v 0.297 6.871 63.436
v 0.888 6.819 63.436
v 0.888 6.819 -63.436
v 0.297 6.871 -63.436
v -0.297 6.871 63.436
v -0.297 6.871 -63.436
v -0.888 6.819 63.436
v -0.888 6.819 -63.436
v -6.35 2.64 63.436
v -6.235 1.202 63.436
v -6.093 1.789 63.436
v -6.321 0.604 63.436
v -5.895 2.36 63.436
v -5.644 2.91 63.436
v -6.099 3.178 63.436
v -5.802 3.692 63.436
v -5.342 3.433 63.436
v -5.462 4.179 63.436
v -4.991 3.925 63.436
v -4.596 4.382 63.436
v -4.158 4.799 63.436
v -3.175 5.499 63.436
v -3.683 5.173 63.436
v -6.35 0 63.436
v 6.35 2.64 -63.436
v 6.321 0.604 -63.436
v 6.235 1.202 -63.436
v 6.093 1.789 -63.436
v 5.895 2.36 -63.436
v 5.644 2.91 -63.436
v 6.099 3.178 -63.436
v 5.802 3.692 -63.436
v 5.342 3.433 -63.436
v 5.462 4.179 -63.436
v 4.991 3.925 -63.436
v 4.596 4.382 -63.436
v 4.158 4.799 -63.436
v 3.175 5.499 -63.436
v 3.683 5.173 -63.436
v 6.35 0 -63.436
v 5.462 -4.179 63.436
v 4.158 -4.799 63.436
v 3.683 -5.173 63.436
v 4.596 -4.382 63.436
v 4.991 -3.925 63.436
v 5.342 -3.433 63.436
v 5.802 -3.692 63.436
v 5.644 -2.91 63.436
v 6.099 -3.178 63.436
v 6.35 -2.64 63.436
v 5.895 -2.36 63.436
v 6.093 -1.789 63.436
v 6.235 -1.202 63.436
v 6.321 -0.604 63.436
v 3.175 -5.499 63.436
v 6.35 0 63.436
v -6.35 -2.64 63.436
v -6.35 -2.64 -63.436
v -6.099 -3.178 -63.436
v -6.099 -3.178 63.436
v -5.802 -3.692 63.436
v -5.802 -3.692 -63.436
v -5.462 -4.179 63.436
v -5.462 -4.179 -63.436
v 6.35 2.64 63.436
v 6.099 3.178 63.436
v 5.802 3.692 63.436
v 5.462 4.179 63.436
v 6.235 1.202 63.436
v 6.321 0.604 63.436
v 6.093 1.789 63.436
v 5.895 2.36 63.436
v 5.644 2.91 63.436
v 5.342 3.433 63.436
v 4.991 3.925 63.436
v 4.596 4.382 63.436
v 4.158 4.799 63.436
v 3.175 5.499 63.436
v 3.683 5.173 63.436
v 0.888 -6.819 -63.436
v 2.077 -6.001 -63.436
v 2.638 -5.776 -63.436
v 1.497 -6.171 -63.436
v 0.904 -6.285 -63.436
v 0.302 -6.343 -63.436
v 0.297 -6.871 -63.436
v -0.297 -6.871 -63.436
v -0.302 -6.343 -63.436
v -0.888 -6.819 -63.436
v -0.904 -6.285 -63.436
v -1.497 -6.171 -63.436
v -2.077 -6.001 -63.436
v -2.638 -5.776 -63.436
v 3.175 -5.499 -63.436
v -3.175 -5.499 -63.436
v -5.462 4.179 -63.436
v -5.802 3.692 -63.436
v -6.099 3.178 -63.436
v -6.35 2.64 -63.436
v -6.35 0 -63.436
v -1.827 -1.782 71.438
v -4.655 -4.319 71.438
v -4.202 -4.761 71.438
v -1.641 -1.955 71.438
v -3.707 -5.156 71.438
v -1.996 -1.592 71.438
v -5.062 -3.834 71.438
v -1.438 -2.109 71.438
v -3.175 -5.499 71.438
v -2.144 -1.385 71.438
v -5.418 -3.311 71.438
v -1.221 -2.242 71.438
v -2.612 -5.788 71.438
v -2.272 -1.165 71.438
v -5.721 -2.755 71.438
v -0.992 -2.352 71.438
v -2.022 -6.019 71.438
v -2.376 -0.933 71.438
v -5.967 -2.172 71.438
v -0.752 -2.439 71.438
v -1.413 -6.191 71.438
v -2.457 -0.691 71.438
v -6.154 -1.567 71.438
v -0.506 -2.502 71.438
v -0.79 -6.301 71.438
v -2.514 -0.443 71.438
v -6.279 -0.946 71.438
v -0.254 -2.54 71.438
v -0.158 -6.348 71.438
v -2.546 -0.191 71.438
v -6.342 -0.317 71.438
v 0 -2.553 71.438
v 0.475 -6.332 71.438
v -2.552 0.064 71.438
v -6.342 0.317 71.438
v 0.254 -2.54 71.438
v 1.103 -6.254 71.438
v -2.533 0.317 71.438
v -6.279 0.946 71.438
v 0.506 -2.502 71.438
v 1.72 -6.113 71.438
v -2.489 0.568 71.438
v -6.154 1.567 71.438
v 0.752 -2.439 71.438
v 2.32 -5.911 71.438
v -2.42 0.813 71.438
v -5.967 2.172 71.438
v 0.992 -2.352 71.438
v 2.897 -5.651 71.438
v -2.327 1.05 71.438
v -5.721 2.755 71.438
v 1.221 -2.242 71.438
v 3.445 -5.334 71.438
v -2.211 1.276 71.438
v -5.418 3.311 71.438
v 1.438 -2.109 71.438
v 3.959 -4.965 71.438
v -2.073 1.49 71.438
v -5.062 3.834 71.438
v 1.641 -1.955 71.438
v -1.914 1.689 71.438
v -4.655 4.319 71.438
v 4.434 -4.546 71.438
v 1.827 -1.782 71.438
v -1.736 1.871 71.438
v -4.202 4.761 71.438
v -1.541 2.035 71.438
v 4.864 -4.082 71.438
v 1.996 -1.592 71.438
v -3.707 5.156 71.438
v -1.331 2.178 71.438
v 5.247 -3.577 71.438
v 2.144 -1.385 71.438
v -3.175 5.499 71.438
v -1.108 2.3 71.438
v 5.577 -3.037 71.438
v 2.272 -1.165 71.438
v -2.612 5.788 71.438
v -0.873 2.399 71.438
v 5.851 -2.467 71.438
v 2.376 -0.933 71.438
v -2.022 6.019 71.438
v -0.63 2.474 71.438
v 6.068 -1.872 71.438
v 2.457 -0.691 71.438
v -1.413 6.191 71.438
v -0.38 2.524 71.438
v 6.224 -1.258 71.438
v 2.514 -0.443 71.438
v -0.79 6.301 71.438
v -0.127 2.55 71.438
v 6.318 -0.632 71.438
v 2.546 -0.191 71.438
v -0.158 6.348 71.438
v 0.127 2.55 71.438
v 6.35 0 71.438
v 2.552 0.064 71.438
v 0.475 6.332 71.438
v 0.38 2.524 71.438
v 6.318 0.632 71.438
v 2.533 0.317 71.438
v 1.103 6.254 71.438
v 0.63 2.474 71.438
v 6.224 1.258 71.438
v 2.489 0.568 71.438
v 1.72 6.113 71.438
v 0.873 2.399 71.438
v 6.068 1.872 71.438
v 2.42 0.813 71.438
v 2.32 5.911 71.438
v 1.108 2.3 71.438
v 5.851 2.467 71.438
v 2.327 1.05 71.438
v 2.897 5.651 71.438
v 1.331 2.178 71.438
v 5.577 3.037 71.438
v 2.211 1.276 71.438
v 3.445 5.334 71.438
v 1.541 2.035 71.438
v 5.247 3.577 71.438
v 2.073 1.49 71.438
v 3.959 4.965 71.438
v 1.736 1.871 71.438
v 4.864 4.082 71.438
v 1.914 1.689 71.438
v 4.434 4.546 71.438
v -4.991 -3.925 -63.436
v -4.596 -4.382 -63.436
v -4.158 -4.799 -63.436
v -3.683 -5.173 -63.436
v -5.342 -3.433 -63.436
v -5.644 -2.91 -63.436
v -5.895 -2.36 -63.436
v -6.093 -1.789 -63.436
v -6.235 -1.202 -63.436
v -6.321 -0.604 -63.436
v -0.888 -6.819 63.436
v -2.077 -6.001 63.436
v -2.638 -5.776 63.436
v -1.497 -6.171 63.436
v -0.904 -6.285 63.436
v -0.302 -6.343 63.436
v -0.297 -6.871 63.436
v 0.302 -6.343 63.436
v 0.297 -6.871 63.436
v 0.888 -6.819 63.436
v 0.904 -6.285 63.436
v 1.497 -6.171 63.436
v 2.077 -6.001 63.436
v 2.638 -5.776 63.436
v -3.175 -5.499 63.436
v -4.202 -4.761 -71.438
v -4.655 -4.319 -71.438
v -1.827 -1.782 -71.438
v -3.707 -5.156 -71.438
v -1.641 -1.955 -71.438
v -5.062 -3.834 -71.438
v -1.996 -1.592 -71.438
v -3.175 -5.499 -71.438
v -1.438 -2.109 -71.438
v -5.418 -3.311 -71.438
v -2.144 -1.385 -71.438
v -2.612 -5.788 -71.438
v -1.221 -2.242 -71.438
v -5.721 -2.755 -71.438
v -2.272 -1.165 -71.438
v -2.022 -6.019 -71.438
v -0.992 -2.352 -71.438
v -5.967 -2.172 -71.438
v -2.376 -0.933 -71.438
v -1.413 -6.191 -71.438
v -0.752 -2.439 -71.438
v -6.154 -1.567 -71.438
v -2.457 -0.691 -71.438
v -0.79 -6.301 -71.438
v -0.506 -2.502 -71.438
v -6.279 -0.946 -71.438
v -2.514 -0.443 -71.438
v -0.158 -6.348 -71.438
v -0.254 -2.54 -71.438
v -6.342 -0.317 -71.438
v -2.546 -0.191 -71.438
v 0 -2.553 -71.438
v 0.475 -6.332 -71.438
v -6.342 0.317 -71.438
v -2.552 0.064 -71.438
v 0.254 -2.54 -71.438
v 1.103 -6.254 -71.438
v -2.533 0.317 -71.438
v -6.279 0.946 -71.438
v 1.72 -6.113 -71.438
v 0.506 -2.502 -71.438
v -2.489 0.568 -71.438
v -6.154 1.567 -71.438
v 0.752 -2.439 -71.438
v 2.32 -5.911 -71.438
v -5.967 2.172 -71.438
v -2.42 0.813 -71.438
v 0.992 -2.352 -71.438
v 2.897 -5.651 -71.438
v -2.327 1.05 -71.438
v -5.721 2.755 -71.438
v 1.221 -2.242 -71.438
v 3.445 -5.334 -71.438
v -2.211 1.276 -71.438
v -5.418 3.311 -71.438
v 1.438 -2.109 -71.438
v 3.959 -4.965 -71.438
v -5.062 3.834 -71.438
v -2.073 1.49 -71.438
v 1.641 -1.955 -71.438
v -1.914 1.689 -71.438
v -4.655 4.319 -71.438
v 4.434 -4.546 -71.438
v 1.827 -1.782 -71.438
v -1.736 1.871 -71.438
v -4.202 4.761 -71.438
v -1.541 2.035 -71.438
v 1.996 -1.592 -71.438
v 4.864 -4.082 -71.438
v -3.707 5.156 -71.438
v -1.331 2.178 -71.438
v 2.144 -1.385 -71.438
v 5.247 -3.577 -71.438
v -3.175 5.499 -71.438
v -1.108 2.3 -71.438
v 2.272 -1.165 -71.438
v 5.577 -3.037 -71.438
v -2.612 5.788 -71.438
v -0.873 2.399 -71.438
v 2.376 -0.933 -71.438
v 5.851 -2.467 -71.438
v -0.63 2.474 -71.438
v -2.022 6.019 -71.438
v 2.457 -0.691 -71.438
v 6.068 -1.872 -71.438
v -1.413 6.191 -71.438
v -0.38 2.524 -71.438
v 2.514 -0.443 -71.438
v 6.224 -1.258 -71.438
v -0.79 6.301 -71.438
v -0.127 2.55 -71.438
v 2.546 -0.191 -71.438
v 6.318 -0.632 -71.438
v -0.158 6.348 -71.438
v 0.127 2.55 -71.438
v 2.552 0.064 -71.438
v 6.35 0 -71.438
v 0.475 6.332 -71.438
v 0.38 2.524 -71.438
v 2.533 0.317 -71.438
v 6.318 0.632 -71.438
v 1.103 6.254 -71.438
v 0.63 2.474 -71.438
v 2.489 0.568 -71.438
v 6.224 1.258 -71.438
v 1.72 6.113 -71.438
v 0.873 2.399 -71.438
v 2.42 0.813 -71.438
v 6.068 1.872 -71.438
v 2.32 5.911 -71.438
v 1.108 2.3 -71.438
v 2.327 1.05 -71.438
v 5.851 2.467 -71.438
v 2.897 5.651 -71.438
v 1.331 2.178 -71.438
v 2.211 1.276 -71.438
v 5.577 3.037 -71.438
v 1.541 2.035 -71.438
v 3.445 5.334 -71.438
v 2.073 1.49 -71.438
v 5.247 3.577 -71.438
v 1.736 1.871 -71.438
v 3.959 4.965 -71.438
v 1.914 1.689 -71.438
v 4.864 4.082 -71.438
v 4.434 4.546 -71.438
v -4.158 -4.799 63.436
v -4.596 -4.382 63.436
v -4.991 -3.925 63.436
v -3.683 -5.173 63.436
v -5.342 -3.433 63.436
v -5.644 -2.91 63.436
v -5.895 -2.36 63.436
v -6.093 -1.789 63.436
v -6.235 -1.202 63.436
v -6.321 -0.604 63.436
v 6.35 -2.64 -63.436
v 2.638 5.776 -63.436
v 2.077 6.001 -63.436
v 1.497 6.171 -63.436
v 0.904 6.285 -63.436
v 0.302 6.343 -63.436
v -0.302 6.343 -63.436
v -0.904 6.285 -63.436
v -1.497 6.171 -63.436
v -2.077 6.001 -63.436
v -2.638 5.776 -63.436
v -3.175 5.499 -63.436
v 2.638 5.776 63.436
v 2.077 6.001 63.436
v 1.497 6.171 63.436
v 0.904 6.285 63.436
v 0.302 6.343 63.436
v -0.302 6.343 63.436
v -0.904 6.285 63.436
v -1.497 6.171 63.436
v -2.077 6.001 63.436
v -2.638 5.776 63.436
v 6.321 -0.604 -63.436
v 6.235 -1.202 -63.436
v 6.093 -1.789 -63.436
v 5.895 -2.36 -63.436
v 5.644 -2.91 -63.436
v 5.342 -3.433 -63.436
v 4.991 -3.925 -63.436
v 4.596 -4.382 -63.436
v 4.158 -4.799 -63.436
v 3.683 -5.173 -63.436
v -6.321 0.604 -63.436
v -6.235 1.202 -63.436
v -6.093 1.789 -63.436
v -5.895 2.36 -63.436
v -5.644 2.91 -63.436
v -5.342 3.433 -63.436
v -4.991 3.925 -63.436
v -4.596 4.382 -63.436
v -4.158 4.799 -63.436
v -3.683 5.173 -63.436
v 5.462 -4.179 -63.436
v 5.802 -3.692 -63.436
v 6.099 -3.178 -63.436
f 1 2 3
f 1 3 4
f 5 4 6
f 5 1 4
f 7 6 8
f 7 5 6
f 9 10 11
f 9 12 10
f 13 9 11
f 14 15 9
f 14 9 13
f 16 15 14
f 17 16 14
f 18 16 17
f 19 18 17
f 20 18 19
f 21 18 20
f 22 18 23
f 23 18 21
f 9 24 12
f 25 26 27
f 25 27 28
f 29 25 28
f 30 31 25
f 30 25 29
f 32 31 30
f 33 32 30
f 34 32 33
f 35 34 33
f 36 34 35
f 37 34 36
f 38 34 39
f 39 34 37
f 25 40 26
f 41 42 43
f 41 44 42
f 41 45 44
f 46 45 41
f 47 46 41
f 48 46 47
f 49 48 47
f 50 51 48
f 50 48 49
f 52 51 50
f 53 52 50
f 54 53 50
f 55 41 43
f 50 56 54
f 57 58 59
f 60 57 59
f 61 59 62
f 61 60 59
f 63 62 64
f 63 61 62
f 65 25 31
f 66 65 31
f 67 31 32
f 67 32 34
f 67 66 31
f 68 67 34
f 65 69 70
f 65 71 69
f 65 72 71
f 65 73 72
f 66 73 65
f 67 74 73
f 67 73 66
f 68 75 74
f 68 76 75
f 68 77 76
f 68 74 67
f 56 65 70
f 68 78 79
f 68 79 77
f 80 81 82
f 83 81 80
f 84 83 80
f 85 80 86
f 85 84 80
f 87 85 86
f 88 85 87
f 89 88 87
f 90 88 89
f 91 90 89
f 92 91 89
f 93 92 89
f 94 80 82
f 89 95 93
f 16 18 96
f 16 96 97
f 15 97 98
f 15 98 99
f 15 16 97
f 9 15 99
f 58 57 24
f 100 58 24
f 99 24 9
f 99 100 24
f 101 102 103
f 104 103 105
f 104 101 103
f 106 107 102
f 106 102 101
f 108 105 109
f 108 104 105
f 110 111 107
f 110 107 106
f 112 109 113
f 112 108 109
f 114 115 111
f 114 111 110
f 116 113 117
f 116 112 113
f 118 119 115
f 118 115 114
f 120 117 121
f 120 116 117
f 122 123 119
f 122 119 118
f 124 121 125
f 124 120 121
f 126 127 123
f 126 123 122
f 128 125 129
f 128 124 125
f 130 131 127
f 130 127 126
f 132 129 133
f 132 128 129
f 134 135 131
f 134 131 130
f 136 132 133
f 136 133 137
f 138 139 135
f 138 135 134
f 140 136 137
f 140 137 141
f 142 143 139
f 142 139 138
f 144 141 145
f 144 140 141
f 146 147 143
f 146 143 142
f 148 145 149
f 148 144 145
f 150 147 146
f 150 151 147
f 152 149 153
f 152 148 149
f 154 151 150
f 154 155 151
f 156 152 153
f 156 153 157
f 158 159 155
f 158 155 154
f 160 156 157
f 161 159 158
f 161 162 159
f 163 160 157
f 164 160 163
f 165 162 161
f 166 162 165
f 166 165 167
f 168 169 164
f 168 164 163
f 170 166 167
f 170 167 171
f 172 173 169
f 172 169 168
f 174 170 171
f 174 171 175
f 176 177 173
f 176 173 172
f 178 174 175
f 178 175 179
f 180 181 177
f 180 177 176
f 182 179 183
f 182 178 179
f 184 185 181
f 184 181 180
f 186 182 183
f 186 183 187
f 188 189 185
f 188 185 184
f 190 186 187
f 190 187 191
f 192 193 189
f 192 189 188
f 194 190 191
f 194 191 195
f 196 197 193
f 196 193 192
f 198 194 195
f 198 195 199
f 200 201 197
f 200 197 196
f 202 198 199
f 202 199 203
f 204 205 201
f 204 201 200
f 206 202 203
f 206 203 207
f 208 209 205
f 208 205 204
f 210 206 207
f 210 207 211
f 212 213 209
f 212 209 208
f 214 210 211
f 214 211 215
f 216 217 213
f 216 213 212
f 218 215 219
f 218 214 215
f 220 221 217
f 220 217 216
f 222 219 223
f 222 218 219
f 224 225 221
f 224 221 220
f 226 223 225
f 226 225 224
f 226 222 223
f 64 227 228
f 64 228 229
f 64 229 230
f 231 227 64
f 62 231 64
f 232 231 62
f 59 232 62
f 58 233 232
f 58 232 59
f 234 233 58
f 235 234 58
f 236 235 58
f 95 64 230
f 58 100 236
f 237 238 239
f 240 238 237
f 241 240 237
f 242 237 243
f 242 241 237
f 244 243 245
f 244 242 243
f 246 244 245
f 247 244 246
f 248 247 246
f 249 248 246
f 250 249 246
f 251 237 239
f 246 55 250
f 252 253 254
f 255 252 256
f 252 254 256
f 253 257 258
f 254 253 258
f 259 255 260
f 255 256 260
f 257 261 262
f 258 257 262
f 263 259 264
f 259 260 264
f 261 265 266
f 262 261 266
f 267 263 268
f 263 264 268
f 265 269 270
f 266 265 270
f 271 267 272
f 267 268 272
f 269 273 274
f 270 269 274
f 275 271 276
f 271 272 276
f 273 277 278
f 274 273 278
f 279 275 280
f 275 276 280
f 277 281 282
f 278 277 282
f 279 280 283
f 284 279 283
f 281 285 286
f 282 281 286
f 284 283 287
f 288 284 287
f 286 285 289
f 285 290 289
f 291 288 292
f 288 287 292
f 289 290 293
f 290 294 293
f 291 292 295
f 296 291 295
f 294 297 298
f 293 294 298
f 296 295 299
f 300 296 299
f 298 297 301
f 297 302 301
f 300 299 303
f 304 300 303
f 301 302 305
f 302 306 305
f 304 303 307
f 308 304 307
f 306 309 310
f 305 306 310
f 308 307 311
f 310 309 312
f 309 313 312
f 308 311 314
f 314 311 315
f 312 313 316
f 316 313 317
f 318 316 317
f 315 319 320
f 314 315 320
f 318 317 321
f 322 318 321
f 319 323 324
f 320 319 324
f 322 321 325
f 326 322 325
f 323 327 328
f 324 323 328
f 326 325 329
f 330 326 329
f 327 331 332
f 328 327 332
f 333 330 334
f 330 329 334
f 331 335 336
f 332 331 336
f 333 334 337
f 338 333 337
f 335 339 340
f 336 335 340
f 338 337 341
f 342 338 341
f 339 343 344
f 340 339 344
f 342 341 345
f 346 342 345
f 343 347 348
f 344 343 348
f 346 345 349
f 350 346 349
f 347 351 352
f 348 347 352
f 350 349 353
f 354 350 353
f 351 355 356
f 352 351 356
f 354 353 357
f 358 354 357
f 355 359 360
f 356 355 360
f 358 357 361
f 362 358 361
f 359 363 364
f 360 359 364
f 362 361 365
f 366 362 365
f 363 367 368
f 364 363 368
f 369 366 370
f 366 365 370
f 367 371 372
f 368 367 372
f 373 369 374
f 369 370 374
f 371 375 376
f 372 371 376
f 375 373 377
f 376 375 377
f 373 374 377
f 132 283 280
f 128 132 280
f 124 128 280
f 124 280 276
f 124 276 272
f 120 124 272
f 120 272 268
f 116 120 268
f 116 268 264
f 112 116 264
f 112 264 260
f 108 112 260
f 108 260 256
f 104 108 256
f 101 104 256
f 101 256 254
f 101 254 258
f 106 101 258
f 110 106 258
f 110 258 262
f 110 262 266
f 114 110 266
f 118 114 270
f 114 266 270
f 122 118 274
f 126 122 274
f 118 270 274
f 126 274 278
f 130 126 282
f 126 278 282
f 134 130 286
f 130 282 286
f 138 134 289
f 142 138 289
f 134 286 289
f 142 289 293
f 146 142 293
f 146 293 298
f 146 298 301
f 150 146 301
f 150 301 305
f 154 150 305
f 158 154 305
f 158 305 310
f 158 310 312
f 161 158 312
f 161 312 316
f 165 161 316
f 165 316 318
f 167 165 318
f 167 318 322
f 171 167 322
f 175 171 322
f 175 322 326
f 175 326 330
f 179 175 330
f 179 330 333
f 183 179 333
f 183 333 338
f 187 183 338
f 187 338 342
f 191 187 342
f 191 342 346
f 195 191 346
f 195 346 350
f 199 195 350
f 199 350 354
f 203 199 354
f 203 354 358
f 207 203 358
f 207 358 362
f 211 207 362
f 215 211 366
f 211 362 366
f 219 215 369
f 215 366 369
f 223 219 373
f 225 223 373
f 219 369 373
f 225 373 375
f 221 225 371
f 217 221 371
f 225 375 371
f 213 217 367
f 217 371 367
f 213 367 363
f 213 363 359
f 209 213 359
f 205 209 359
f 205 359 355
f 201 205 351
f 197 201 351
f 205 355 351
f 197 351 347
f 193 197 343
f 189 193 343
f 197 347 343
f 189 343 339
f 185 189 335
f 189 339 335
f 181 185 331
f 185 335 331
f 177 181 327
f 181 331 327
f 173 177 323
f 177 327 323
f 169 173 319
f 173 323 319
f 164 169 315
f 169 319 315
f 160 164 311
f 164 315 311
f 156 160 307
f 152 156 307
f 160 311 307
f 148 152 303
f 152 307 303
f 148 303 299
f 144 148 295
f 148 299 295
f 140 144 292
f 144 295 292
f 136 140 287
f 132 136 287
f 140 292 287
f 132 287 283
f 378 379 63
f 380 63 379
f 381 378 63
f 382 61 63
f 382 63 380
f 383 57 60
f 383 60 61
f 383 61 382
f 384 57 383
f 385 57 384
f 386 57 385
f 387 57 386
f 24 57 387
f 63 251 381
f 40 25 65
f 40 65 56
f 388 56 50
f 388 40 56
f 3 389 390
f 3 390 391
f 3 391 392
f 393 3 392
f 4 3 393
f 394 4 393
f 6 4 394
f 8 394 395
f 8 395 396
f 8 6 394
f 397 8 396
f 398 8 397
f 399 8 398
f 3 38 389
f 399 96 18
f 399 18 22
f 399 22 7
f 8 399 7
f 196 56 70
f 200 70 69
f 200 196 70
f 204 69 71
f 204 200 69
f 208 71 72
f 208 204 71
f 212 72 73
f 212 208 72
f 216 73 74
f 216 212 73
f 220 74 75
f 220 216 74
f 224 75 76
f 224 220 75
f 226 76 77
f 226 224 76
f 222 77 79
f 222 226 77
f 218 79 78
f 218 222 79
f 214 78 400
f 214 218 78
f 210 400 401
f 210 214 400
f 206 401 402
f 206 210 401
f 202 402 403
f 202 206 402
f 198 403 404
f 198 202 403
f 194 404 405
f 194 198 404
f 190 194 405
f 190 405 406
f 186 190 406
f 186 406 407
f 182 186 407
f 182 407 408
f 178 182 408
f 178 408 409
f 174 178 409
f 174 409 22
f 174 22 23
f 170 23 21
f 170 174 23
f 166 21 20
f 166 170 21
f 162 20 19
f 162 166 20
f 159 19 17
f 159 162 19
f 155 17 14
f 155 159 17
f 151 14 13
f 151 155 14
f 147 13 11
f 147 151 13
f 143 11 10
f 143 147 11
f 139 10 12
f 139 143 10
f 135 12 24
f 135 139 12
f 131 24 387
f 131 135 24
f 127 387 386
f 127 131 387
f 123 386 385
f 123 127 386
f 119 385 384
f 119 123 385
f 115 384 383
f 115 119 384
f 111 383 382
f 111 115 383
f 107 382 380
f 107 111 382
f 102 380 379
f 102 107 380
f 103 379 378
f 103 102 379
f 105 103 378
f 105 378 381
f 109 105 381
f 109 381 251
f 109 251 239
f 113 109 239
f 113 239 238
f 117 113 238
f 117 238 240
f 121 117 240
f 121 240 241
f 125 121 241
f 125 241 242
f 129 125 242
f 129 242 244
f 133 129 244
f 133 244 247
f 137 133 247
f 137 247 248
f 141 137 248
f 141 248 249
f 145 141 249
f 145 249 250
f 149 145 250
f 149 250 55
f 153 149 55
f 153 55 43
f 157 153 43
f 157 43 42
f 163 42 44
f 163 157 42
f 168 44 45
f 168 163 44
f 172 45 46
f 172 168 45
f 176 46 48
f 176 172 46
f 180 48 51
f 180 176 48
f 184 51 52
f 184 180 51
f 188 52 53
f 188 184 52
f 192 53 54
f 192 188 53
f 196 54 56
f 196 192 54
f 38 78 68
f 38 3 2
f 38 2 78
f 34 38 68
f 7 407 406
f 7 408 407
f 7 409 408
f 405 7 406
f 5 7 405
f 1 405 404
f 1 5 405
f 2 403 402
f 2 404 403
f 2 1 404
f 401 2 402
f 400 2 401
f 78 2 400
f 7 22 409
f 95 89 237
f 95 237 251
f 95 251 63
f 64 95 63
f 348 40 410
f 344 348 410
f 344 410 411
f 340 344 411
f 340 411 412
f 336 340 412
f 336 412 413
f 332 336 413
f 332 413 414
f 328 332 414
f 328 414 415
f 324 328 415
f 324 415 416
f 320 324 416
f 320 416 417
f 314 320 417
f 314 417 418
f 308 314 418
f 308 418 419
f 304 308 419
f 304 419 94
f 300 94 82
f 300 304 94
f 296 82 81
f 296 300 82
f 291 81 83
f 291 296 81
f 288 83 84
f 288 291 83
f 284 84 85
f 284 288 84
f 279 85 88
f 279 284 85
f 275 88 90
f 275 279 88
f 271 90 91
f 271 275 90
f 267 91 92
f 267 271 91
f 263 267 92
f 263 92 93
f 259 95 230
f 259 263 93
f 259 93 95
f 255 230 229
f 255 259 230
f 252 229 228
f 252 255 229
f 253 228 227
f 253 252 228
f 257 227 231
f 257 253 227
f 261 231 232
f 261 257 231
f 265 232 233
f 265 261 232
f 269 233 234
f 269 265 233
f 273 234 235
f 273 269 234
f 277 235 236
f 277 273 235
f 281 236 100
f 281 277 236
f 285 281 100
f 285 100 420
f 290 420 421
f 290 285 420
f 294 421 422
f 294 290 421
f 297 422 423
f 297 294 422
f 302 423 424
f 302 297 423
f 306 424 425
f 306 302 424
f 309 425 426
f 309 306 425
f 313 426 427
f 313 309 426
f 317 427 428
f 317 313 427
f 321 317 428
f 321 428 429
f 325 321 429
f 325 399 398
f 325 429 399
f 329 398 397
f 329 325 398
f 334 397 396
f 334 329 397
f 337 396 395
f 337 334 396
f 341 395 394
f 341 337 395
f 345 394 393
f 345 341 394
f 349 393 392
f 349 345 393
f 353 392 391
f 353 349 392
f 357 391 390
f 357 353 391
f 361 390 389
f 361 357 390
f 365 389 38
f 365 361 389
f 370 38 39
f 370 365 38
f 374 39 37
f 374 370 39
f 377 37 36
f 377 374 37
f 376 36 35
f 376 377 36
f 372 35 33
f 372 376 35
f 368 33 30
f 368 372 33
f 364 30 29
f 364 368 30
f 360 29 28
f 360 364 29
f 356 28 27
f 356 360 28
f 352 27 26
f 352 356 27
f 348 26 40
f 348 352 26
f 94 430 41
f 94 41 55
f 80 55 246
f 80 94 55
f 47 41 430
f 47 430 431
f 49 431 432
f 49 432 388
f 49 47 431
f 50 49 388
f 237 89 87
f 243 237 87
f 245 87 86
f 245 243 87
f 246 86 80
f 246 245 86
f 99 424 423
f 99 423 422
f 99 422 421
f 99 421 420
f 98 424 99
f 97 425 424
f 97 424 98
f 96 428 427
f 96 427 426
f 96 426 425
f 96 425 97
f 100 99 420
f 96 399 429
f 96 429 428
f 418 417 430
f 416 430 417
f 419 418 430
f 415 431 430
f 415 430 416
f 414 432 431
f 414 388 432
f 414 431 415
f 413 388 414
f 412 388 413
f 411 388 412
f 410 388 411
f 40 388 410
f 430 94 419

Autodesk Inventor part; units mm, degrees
ref_plane "YZ Plane" through (0, 0, 0) normal (1, 0, 0) x (0, 1, 0)
ref_plane "XZ Plane" through (0, 0, 0) normal (0, 1, 0) x (-1, 0, 0)
ref_plane "XY Plane" through (0, 0, 0) normal (0, 0, 1) x (1, 0, 0)
sketch "Sketch1" plane through (0, 0, 0) normal (0, 0, 1) x (1, 0, 0)
  line L0 (-6.35, -3.6662) -> (-6.35, 3.6662)
  line L1 (-6.35, 3.6662) -> (0, 7.3323)
  line L2 (0, 7.3323) -> (6.35, 3.6662)
  line L3 (6.35, 3.6662) -> (6.35, -3.6662)
  line L4 (6.35, -3.6662) -> (0, -7.3323)
  line L5 (0, -7.3323) -> (-6.35, -3.6662)
  point P0 (0, 0)
  point P1 (0, 0)
  dimension "Size" = 12.7
extrude "Extrusion1" add sketch "Sketch1" along normal mid plane 142.875
sketch "Sketch3" plane through (0, 0, 71.4375) normal (0, 0, 1) x (1, 0, 0)
  line L0 (-6.35, 3.6662) -> (0, 7.3323) construction
  line L1 (0, 7.3323) -> (6.35, 3.6662) construction
  line L2 (6.35, 3.6662) -> (6.35, -3.6662) construction
  line L3 (6.35, -3.6662) -> (0, -7.3323) construction
  line L4 (0, -7.3323) -> (-6.35, -3.6662) construction
  line L5 (-6.35, -3.6662) -> (-6.35, 3.6662) construction
  point P0 (0, 0)
hole "Hole1" at (0, 0, 71.4375) direction (0, 0, -1) diameter 5.1054 end through all
sketch "Sketch4" plane through (0, 0, 71.4375) normal (0, 0, 1) x (1, 0, 0)
  circle A0 centre (0, 0) radius 2.5527 construction
  line L0 (-6.35, 3.6662) -> (0, 7.3323) construction
  line L1 (0, 7.3323) -> (6.35, 3.6662) construction
  line L2 (6.35, 3.6662) -> (6.35, -3.6662) construction
  line L3 (6.35, -3.6662) -> (0, -7.3323) construction
  line L4 (0, -7.3323) -> (-6.35, -3.6662) construction
  line L5 (-6.35, -3.6662) -> (-6.35, 3.6662) construction
  circle A1 centre (0, 0) radius 6.8771
  circle A2 centre (0, 0) radius 8.89
  dimension "thunder" = 13.7541
  dimension "d16" = 17.78
extrude "Extrusion3" cut sketch "Sketch4" against normal through all
sketch "Sketch5" plane through (0, 0, 71.4375) normal (0, 0, 1) x (1, 0, 0)
  arc A0 (5.4616, -4.1791) -> (6.35, -2.6403) centre (0, 0) ccw projected
  line L0 (5.4616, -4.1791) -> (0.8884, -6.8194) projected
  arc A1 (-0.8884, -6.8194) -> (0.8884, -6.8194) centre (0, 0) ccw projected
  line L1 (-0.8884, -6.8194) -> (-5.4616, -4.1791) projected
  arc A2 (-6.35, -2.6403) -> (-5.4616, -4.1791) centre (0, 0) ccw projected
  line L2 (-6.35, -2.6403) -> (-6.35, 2.6403) projected
  arc A3 (-5.4616, 4.1791) -> (-6.35, 2.6403) centre (0, 0) ccw projected
  line L3 (-5.4616, 4.1791) -> (-0.8884, 6.8194) projected
  arc A4 (0.8884, 6.8194) -> (-0.8884, 6.8194) centre (0, 0) ccw projected
  line L4 (0.8884, 6.8194) -> (5.4616, 4.1791) projected
  arc A5 (6.35, 2.6403) -> (5.4616, 4.1791) centre (0, 0) ccw projected
  line L5 (6.35, 2.6403) -> (6.35, -2.6403) projected
  circle A6 centre (0, 0) radius 2.5527 projected
  circle A7 centre (0, 0) radius 6.35
  point P0 (-3.175, 5.4993)
  point P1 (3.175, 5.4993)
  point P2 (6.35, 0)
  point P3 (-6.35, 0)
  point P4 (-3.175, -5.4993)
  point P5 (3.175, -5.4993)
  dimension "d19" = 12.7
extrude "Extrusion4" cut sketch "Sketch5" against normal blind 8.001 contours L0 A7 L5 A0 | L0 A1 L1 A7 | A7 L4 A5 L5 | L1 A2 L2 A7 | A7 L3 A4 L4 | L2 A3 L3 A7
mirror "Mirror2" about plane through (0, 0, 0) normal (0, 0, 1) of "Extrusion4"
equation "\"bearing\" = 25.4"
properties part number "CL4-018" material "Aluminum 6061"
